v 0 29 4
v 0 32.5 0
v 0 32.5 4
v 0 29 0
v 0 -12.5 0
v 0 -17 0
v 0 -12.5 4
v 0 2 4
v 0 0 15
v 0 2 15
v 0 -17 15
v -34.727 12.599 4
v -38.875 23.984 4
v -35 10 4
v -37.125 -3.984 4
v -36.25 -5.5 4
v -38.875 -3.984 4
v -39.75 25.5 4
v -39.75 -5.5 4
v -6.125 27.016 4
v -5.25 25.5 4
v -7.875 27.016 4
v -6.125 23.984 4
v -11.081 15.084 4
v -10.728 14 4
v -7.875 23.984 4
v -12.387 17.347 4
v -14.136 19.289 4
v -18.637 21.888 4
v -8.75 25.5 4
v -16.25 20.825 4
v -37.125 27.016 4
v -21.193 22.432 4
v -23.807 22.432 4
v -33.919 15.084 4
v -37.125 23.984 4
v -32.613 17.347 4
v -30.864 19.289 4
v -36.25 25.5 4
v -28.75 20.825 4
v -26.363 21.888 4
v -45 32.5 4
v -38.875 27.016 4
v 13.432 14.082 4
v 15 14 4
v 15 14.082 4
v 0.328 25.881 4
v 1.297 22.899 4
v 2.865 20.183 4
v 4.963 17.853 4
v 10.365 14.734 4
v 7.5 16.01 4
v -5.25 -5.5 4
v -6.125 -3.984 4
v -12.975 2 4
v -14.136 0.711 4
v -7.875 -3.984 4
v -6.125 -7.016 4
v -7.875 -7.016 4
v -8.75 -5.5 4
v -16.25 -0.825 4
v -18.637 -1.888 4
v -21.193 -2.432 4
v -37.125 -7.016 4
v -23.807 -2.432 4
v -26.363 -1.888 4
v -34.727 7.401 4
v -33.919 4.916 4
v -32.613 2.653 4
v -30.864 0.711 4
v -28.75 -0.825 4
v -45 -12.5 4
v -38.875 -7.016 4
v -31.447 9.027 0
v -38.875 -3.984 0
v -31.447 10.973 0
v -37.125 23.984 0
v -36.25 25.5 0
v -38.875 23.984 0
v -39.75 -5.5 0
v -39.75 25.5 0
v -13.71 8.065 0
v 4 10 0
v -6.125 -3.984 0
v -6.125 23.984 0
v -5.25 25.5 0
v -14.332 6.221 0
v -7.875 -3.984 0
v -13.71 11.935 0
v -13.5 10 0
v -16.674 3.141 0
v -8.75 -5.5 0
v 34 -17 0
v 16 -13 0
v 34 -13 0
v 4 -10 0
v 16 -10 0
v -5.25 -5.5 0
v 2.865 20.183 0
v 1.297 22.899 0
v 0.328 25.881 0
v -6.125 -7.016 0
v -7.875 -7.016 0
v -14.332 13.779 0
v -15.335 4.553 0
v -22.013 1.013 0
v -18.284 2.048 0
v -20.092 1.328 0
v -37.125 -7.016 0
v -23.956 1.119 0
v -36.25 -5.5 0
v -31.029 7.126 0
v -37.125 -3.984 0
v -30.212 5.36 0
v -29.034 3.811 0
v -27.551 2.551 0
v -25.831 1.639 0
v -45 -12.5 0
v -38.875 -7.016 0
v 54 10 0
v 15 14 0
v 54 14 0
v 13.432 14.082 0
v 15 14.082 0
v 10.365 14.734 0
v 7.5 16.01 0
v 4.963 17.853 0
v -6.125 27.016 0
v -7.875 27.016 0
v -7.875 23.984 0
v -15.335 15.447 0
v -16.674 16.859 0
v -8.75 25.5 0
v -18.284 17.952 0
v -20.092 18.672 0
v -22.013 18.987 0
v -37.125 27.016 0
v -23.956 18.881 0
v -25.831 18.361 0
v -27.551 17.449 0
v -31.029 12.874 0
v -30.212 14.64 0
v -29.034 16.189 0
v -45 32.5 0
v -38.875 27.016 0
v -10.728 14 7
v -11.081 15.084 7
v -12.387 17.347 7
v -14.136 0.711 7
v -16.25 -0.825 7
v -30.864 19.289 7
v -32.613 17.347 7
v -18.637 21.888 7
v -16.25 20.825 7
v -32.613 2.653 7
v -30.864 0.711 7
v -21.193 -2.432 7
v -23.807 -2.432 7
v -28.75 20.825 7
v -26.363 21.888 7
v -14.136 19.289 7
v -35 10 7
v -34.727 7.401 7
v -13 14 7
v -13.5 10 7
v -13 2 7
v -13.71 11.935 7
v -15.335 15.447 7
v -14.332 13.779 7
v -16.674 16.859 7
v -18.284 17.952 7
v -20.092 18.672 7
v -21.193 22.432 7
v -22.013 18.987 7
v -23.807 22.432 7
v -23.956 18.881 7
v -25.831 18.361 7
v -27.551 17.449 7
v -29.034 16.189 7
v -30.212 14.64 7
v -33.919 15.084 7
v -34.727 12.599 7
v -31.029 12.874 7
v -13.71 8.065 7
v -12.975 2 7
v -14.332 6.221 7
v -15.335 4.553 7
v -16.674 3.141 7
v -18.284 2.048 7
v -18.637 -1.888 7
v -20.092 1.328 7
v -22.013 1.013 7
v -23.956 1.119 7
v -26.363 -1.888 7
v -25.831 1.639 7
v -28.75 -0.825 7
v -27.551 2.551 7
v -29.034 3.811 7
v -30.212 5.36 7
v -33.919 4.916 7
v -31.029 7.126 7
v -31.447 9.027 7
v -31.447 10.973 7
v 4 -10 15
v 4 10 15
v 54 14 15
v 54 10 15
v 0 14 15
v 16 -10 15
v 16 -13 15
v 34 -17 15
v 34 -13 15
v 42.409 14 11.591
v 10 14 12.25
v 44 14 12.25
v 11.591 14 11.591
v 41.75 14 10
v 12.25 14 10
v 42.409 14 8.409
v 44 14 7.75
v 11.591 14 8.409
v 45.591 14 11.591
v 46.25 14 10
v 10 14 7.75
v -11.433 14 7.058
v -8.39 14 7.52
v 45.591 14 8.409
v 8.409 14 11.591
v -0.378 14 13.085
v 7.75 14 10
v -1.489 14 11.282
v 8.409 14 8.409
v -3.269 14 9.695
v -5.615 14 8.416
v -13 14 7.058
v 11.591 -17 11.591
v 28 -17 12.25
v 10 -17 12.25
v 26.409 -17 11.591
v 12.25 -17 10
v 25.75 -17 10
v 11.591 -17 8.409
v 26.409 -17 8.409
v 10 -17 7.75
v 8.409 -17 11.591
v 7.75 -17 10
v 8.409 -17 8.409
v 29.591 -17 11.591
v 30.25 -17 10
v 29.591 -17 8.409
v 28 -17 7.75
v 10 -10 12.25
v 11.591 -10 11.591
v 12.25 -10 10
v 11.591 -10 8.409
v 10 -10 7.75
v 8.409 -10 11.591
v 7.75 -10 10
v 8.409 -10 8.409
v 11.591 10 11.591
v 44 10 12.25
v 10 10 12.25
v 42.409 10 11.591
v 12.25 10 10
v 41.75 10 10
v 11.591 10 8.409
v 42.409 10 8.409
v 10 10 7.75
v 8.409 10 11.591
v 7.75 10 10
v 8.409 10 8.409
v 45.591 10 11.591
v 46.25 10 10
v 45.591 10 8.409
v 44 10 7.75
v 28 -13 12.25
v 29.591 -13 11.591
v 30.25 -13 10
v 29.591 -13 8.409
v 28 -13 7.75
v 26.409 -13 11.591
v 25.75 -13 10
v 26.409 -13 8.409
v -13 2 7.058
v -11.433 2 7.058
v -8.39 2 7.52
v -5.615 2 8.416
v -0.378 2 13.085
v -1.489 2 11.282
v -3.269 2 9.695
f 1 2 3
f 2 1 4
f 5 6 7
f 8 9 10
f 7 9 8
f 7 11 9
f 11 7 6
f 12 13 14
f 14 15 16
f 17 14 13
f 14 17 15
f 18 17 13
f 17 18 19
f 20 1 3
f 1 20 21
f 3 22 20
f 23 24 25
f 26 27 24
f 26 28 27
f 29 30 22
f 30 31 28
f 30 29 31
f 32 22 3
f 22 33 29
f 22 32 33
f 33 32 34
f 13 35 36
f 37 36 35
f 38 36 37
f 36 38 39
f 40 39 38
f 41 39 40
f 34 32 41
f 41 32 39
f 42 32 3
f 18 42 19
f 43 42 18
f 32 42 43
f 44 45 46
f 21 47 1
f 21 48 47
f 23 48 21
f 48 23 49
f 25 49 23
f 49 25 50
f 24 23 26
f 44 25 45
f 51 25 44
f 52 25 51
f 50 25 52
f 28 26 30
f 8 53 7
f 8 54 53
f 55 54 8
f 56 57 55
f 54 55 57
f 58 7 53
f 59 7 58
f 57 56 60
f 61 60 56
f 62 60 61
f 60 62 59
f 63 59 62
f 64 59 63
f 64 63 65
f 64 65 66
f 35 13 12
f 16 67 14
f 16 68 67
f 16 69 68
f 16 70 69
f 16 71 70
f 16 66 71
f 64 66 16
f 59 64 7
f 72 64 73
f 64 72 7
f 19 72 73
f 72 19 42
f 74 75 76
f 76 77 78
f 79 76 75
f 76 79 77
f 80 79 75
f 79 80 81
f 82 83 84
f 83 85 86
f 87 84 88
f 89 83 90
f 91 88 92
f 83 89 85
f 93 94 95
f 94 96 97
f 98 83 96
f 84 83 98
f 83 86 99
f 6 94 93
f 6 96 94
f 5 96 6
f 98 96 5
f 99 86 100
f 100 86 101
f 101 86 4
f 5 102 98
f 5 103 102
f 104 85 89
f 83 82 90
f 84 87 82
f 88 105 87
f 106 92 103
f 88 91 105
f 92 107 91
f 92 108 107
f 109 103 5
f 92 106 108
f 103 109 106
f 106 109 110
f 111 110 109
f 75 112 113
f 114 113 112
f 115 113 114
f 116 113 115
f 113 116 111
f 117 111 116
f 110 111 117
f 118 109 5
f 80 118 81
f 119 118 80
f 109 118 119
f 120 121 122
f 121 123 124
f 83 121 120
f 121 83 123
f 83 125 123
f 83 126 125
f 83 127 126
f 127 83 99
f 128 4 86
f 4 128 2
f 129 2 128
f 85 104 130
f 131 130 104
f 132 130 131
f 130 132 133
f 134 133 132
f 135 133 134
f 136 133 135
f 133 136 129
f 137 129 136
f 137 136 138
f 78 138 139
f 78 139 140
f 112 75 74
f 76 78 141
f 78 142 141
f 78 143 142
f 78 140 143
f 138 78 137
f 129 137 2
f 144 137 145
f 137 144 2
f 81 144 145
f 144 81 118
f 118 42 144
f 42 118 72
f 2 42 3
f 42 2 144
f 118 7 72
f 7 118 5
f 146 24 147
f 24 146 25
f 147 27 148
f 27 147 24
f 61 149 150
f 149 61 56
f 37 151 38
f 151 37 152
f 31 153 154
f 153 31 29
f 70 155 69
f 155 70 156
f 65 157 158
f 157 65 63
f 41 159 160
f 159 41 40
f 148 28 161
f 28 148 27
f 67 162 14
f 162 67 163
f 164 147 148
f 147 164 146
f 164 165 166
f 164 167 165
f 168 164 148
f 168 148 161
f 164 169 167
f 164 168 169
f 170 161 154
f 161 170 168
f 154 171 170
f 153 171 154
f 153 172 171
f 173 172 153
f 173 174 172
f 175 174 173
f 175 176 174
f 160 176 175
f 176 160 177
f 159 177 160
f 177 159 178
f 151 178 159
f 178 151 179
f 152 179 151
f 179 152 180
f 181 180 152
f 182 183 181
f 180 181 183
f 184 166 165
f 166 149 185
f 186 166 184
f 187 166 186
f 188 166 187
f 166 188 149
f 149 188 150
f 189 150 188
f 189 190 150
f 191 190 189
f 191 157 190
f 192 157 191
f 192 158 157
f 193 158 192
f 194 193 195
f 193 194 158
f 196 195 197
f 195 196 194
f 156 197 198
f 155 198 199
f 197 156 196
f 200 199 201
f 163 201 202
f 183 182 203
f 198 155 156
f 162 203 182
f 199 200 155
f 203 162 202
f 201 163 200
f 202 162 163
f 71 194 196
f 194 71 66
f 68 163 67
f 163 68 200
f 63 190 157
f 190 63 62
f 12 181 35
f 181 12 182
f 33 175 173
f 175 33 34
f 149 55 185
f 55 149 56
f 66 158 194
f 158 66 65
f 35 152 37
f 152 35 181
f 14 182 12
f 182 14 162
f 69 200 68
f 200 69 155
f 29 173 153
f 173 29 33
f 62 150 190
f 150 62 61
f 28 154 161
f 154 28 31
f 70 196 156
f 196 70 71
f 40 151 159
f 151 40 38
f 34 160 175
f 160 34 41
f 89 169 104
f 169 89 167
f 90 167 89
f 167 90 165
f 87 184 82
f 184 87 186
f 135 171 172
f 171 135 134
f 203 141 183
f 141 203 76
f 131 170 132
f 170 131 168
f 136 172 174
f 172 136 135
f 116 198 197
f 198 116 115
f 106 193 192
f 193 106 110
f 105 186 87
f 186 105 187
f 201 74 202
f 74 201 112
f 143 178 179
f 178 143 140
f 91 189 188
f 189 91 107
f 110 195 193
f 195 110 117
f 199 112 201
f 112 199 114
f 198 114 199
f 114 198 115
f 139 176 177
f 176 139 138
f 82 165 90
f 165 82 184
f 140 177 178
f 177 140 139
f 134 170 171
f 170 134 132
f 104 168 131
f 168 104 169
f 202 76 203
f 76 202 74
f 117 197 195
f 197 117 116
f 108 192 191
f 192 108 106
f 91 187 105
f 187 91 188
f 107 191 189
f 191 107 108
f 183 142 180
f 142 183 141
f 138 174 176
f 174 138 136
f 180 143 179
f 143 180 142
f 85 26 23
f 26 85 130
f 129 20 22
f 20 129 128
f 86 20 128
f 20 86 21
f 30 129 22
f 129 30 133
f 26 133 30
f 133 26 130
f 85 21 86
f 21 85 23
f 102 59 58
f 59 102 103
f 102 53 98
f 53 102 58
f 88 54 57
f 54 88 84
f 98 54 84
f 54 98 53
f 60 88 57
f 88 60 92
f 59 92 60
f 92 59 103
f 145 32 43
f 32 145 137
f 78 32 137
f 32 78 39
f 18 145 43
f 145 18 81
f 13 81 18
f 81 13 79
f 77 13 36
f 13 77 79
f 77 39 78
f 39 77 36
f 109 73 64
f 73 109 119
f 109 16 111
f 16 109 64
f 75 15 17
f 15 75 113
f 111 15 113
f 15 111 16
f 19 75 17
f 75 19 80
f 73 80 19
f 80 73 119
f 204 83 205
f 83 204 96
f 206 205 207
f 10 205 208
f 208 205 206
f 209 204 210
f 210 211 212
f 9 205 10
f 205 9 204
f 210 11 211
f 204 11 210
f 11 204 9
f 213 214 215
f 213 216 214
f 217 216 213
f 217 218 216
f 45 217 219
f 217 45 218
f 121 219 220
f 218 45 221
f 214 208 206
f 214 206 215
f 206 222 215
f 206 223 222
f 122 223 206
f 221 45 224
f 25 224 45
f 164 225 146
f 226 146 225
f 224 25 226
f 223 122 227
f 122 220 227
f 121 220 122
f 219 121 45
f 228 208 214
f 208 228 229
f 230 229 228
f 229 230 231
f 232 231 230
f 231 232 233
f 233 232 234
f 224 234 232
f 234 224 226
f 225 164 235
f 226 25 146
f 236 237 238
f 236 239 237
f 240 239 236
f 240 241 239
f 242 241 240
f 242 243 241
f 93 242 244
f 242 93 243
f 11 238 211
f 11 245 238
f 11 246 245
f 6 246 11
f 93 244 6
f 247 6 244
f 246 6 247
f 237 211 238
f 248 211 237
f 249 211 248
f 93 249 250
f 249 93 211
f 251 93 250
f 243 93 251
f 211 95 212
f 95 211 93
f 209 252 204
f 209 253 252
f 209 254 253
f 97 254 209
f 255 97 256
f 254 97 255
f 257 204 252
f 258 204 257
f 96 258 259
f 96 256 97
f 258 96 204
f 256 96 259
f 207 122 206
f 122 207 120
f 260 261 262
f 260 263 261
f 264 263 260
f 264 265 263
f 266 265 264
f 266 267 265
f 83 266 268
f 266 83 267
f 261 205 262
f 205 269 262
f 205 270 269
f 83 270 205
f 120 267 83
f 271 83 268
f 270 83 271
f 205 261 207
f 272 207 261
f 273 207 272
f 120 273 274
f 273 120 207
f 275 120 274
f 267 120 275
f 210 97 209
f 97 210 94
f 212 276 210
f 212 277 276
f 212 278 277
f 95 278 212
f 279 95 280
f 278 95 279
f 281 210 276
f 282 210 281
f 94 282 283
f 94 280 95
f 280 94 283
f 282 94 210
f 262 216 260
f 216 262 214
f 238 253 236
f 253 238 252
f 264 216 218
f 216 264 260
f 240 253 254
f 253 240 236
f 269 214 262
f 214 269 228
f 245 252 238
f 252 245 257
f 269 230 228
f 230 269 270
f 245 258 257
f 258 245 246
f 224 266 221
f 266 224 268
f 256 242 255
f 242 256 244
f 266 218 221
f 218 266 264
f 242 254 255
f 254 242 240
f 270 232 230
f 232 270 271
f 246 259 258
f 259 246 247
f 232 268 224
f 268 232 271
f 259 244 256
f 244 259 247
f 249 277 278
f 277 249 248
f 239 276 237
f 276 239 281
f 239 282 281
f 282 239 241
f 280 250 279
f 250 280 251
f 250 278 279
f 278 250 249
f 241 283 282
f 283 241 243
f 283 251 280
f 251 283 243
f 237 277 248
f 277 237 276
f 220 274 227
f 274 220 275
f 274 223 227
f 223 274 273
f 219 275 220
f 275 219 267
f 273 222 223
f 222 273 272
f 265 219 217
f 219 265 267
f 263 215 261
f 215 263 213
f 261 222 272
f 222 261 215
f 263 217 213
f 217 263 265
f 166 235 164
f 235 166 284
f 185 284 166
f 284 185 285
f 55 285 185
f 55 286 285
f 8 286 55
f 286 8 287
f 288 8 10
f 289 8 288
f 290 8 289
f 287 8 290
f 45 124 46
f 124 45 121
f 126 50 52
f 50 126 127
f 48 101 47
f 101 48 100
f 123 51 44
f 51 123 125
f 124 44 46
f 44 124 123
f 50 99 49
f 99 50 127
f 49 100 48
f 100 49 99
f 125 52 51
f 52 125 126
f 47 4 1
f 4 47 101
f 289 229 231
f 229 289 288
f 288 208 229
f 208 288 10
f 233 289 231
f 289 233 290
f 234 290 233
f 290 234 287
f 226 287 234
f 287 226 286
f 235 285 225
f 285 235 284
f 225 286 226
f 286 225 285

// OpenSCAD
///////////////////////////////////////////////////////////////////////////////////
// Parts for building a 3D Printer with aluminium extrusions an makerslide parts //
//                                                                               //
//  These are simple parts for using with FreeCAD (openscad module needed.       //
//  The parts are refined inside FreeCAD                                         //
//                                                                               //
//  (c) Holger Pasligh                                                           //
//  You can use this parts for your own purpose, as long you did not sell them   //
//                                                                               //
///////////////////////////////////////////////////////////////////////////////////


// motormount for x-axis
// mounts on makerslide

//construction
difference(){
	union(){
		translate([-22.5,10,0])motorplate();
		bracket();
		translate([-13,2,0])cube([17,12,15]);
		translate([0,10,0])cube([15,19,4]);
	}
	translate([15,29,-1])cylinder(r=15, h=4+2);
	translate([-13,0,15])rotate([-90,0,0])scale([13/8,1,1])cylinder(r=8,h=15);
}

//modules
module motorplate(){
difference(){
	union(){
		translate([-22.5,-22.5,0])cube([45,45,4]);
		cylinder(d=25, h=7);
	}
	translate([0,0,-1])cylinder(d=18, h=7+2);
	translate([ 15.5, 15.5,-1])cylinder(d=3.5, h=4+2);
	translate([ 15.5,-15.5,-1])cylinder(d=3.5, h=4+2);
	translate([-15.5, 15.5,-1])cylinder(d=3.5, h=4+2);
	translate([-15.5,-15.5,-1])cylinder(d=3.5, h=4+2);
}
}

module bracket(){
difference(){
	union(){
		translate([0,-14-3,0])cube([4,28+3,15]);
		translate([0,-14-3,0])cube([30+4,4+3,15]);
		translate([0, 10,0])cube([50+4,4,15]);
	}
	translate([16,-13,-1])cube([30,4,15+2]);
	translate([10,14+1,10])rotate([90,0,0])cylinder(d=4.5, h=28+3+2);
	translate([28,1-13,10])rotate([90,0,0])cylinder(d=4.5, h=4+2);
	translate([44,10-1,10])rotate([-90,0,0])cylinder(d=4.5, h=4+2);
}
}
